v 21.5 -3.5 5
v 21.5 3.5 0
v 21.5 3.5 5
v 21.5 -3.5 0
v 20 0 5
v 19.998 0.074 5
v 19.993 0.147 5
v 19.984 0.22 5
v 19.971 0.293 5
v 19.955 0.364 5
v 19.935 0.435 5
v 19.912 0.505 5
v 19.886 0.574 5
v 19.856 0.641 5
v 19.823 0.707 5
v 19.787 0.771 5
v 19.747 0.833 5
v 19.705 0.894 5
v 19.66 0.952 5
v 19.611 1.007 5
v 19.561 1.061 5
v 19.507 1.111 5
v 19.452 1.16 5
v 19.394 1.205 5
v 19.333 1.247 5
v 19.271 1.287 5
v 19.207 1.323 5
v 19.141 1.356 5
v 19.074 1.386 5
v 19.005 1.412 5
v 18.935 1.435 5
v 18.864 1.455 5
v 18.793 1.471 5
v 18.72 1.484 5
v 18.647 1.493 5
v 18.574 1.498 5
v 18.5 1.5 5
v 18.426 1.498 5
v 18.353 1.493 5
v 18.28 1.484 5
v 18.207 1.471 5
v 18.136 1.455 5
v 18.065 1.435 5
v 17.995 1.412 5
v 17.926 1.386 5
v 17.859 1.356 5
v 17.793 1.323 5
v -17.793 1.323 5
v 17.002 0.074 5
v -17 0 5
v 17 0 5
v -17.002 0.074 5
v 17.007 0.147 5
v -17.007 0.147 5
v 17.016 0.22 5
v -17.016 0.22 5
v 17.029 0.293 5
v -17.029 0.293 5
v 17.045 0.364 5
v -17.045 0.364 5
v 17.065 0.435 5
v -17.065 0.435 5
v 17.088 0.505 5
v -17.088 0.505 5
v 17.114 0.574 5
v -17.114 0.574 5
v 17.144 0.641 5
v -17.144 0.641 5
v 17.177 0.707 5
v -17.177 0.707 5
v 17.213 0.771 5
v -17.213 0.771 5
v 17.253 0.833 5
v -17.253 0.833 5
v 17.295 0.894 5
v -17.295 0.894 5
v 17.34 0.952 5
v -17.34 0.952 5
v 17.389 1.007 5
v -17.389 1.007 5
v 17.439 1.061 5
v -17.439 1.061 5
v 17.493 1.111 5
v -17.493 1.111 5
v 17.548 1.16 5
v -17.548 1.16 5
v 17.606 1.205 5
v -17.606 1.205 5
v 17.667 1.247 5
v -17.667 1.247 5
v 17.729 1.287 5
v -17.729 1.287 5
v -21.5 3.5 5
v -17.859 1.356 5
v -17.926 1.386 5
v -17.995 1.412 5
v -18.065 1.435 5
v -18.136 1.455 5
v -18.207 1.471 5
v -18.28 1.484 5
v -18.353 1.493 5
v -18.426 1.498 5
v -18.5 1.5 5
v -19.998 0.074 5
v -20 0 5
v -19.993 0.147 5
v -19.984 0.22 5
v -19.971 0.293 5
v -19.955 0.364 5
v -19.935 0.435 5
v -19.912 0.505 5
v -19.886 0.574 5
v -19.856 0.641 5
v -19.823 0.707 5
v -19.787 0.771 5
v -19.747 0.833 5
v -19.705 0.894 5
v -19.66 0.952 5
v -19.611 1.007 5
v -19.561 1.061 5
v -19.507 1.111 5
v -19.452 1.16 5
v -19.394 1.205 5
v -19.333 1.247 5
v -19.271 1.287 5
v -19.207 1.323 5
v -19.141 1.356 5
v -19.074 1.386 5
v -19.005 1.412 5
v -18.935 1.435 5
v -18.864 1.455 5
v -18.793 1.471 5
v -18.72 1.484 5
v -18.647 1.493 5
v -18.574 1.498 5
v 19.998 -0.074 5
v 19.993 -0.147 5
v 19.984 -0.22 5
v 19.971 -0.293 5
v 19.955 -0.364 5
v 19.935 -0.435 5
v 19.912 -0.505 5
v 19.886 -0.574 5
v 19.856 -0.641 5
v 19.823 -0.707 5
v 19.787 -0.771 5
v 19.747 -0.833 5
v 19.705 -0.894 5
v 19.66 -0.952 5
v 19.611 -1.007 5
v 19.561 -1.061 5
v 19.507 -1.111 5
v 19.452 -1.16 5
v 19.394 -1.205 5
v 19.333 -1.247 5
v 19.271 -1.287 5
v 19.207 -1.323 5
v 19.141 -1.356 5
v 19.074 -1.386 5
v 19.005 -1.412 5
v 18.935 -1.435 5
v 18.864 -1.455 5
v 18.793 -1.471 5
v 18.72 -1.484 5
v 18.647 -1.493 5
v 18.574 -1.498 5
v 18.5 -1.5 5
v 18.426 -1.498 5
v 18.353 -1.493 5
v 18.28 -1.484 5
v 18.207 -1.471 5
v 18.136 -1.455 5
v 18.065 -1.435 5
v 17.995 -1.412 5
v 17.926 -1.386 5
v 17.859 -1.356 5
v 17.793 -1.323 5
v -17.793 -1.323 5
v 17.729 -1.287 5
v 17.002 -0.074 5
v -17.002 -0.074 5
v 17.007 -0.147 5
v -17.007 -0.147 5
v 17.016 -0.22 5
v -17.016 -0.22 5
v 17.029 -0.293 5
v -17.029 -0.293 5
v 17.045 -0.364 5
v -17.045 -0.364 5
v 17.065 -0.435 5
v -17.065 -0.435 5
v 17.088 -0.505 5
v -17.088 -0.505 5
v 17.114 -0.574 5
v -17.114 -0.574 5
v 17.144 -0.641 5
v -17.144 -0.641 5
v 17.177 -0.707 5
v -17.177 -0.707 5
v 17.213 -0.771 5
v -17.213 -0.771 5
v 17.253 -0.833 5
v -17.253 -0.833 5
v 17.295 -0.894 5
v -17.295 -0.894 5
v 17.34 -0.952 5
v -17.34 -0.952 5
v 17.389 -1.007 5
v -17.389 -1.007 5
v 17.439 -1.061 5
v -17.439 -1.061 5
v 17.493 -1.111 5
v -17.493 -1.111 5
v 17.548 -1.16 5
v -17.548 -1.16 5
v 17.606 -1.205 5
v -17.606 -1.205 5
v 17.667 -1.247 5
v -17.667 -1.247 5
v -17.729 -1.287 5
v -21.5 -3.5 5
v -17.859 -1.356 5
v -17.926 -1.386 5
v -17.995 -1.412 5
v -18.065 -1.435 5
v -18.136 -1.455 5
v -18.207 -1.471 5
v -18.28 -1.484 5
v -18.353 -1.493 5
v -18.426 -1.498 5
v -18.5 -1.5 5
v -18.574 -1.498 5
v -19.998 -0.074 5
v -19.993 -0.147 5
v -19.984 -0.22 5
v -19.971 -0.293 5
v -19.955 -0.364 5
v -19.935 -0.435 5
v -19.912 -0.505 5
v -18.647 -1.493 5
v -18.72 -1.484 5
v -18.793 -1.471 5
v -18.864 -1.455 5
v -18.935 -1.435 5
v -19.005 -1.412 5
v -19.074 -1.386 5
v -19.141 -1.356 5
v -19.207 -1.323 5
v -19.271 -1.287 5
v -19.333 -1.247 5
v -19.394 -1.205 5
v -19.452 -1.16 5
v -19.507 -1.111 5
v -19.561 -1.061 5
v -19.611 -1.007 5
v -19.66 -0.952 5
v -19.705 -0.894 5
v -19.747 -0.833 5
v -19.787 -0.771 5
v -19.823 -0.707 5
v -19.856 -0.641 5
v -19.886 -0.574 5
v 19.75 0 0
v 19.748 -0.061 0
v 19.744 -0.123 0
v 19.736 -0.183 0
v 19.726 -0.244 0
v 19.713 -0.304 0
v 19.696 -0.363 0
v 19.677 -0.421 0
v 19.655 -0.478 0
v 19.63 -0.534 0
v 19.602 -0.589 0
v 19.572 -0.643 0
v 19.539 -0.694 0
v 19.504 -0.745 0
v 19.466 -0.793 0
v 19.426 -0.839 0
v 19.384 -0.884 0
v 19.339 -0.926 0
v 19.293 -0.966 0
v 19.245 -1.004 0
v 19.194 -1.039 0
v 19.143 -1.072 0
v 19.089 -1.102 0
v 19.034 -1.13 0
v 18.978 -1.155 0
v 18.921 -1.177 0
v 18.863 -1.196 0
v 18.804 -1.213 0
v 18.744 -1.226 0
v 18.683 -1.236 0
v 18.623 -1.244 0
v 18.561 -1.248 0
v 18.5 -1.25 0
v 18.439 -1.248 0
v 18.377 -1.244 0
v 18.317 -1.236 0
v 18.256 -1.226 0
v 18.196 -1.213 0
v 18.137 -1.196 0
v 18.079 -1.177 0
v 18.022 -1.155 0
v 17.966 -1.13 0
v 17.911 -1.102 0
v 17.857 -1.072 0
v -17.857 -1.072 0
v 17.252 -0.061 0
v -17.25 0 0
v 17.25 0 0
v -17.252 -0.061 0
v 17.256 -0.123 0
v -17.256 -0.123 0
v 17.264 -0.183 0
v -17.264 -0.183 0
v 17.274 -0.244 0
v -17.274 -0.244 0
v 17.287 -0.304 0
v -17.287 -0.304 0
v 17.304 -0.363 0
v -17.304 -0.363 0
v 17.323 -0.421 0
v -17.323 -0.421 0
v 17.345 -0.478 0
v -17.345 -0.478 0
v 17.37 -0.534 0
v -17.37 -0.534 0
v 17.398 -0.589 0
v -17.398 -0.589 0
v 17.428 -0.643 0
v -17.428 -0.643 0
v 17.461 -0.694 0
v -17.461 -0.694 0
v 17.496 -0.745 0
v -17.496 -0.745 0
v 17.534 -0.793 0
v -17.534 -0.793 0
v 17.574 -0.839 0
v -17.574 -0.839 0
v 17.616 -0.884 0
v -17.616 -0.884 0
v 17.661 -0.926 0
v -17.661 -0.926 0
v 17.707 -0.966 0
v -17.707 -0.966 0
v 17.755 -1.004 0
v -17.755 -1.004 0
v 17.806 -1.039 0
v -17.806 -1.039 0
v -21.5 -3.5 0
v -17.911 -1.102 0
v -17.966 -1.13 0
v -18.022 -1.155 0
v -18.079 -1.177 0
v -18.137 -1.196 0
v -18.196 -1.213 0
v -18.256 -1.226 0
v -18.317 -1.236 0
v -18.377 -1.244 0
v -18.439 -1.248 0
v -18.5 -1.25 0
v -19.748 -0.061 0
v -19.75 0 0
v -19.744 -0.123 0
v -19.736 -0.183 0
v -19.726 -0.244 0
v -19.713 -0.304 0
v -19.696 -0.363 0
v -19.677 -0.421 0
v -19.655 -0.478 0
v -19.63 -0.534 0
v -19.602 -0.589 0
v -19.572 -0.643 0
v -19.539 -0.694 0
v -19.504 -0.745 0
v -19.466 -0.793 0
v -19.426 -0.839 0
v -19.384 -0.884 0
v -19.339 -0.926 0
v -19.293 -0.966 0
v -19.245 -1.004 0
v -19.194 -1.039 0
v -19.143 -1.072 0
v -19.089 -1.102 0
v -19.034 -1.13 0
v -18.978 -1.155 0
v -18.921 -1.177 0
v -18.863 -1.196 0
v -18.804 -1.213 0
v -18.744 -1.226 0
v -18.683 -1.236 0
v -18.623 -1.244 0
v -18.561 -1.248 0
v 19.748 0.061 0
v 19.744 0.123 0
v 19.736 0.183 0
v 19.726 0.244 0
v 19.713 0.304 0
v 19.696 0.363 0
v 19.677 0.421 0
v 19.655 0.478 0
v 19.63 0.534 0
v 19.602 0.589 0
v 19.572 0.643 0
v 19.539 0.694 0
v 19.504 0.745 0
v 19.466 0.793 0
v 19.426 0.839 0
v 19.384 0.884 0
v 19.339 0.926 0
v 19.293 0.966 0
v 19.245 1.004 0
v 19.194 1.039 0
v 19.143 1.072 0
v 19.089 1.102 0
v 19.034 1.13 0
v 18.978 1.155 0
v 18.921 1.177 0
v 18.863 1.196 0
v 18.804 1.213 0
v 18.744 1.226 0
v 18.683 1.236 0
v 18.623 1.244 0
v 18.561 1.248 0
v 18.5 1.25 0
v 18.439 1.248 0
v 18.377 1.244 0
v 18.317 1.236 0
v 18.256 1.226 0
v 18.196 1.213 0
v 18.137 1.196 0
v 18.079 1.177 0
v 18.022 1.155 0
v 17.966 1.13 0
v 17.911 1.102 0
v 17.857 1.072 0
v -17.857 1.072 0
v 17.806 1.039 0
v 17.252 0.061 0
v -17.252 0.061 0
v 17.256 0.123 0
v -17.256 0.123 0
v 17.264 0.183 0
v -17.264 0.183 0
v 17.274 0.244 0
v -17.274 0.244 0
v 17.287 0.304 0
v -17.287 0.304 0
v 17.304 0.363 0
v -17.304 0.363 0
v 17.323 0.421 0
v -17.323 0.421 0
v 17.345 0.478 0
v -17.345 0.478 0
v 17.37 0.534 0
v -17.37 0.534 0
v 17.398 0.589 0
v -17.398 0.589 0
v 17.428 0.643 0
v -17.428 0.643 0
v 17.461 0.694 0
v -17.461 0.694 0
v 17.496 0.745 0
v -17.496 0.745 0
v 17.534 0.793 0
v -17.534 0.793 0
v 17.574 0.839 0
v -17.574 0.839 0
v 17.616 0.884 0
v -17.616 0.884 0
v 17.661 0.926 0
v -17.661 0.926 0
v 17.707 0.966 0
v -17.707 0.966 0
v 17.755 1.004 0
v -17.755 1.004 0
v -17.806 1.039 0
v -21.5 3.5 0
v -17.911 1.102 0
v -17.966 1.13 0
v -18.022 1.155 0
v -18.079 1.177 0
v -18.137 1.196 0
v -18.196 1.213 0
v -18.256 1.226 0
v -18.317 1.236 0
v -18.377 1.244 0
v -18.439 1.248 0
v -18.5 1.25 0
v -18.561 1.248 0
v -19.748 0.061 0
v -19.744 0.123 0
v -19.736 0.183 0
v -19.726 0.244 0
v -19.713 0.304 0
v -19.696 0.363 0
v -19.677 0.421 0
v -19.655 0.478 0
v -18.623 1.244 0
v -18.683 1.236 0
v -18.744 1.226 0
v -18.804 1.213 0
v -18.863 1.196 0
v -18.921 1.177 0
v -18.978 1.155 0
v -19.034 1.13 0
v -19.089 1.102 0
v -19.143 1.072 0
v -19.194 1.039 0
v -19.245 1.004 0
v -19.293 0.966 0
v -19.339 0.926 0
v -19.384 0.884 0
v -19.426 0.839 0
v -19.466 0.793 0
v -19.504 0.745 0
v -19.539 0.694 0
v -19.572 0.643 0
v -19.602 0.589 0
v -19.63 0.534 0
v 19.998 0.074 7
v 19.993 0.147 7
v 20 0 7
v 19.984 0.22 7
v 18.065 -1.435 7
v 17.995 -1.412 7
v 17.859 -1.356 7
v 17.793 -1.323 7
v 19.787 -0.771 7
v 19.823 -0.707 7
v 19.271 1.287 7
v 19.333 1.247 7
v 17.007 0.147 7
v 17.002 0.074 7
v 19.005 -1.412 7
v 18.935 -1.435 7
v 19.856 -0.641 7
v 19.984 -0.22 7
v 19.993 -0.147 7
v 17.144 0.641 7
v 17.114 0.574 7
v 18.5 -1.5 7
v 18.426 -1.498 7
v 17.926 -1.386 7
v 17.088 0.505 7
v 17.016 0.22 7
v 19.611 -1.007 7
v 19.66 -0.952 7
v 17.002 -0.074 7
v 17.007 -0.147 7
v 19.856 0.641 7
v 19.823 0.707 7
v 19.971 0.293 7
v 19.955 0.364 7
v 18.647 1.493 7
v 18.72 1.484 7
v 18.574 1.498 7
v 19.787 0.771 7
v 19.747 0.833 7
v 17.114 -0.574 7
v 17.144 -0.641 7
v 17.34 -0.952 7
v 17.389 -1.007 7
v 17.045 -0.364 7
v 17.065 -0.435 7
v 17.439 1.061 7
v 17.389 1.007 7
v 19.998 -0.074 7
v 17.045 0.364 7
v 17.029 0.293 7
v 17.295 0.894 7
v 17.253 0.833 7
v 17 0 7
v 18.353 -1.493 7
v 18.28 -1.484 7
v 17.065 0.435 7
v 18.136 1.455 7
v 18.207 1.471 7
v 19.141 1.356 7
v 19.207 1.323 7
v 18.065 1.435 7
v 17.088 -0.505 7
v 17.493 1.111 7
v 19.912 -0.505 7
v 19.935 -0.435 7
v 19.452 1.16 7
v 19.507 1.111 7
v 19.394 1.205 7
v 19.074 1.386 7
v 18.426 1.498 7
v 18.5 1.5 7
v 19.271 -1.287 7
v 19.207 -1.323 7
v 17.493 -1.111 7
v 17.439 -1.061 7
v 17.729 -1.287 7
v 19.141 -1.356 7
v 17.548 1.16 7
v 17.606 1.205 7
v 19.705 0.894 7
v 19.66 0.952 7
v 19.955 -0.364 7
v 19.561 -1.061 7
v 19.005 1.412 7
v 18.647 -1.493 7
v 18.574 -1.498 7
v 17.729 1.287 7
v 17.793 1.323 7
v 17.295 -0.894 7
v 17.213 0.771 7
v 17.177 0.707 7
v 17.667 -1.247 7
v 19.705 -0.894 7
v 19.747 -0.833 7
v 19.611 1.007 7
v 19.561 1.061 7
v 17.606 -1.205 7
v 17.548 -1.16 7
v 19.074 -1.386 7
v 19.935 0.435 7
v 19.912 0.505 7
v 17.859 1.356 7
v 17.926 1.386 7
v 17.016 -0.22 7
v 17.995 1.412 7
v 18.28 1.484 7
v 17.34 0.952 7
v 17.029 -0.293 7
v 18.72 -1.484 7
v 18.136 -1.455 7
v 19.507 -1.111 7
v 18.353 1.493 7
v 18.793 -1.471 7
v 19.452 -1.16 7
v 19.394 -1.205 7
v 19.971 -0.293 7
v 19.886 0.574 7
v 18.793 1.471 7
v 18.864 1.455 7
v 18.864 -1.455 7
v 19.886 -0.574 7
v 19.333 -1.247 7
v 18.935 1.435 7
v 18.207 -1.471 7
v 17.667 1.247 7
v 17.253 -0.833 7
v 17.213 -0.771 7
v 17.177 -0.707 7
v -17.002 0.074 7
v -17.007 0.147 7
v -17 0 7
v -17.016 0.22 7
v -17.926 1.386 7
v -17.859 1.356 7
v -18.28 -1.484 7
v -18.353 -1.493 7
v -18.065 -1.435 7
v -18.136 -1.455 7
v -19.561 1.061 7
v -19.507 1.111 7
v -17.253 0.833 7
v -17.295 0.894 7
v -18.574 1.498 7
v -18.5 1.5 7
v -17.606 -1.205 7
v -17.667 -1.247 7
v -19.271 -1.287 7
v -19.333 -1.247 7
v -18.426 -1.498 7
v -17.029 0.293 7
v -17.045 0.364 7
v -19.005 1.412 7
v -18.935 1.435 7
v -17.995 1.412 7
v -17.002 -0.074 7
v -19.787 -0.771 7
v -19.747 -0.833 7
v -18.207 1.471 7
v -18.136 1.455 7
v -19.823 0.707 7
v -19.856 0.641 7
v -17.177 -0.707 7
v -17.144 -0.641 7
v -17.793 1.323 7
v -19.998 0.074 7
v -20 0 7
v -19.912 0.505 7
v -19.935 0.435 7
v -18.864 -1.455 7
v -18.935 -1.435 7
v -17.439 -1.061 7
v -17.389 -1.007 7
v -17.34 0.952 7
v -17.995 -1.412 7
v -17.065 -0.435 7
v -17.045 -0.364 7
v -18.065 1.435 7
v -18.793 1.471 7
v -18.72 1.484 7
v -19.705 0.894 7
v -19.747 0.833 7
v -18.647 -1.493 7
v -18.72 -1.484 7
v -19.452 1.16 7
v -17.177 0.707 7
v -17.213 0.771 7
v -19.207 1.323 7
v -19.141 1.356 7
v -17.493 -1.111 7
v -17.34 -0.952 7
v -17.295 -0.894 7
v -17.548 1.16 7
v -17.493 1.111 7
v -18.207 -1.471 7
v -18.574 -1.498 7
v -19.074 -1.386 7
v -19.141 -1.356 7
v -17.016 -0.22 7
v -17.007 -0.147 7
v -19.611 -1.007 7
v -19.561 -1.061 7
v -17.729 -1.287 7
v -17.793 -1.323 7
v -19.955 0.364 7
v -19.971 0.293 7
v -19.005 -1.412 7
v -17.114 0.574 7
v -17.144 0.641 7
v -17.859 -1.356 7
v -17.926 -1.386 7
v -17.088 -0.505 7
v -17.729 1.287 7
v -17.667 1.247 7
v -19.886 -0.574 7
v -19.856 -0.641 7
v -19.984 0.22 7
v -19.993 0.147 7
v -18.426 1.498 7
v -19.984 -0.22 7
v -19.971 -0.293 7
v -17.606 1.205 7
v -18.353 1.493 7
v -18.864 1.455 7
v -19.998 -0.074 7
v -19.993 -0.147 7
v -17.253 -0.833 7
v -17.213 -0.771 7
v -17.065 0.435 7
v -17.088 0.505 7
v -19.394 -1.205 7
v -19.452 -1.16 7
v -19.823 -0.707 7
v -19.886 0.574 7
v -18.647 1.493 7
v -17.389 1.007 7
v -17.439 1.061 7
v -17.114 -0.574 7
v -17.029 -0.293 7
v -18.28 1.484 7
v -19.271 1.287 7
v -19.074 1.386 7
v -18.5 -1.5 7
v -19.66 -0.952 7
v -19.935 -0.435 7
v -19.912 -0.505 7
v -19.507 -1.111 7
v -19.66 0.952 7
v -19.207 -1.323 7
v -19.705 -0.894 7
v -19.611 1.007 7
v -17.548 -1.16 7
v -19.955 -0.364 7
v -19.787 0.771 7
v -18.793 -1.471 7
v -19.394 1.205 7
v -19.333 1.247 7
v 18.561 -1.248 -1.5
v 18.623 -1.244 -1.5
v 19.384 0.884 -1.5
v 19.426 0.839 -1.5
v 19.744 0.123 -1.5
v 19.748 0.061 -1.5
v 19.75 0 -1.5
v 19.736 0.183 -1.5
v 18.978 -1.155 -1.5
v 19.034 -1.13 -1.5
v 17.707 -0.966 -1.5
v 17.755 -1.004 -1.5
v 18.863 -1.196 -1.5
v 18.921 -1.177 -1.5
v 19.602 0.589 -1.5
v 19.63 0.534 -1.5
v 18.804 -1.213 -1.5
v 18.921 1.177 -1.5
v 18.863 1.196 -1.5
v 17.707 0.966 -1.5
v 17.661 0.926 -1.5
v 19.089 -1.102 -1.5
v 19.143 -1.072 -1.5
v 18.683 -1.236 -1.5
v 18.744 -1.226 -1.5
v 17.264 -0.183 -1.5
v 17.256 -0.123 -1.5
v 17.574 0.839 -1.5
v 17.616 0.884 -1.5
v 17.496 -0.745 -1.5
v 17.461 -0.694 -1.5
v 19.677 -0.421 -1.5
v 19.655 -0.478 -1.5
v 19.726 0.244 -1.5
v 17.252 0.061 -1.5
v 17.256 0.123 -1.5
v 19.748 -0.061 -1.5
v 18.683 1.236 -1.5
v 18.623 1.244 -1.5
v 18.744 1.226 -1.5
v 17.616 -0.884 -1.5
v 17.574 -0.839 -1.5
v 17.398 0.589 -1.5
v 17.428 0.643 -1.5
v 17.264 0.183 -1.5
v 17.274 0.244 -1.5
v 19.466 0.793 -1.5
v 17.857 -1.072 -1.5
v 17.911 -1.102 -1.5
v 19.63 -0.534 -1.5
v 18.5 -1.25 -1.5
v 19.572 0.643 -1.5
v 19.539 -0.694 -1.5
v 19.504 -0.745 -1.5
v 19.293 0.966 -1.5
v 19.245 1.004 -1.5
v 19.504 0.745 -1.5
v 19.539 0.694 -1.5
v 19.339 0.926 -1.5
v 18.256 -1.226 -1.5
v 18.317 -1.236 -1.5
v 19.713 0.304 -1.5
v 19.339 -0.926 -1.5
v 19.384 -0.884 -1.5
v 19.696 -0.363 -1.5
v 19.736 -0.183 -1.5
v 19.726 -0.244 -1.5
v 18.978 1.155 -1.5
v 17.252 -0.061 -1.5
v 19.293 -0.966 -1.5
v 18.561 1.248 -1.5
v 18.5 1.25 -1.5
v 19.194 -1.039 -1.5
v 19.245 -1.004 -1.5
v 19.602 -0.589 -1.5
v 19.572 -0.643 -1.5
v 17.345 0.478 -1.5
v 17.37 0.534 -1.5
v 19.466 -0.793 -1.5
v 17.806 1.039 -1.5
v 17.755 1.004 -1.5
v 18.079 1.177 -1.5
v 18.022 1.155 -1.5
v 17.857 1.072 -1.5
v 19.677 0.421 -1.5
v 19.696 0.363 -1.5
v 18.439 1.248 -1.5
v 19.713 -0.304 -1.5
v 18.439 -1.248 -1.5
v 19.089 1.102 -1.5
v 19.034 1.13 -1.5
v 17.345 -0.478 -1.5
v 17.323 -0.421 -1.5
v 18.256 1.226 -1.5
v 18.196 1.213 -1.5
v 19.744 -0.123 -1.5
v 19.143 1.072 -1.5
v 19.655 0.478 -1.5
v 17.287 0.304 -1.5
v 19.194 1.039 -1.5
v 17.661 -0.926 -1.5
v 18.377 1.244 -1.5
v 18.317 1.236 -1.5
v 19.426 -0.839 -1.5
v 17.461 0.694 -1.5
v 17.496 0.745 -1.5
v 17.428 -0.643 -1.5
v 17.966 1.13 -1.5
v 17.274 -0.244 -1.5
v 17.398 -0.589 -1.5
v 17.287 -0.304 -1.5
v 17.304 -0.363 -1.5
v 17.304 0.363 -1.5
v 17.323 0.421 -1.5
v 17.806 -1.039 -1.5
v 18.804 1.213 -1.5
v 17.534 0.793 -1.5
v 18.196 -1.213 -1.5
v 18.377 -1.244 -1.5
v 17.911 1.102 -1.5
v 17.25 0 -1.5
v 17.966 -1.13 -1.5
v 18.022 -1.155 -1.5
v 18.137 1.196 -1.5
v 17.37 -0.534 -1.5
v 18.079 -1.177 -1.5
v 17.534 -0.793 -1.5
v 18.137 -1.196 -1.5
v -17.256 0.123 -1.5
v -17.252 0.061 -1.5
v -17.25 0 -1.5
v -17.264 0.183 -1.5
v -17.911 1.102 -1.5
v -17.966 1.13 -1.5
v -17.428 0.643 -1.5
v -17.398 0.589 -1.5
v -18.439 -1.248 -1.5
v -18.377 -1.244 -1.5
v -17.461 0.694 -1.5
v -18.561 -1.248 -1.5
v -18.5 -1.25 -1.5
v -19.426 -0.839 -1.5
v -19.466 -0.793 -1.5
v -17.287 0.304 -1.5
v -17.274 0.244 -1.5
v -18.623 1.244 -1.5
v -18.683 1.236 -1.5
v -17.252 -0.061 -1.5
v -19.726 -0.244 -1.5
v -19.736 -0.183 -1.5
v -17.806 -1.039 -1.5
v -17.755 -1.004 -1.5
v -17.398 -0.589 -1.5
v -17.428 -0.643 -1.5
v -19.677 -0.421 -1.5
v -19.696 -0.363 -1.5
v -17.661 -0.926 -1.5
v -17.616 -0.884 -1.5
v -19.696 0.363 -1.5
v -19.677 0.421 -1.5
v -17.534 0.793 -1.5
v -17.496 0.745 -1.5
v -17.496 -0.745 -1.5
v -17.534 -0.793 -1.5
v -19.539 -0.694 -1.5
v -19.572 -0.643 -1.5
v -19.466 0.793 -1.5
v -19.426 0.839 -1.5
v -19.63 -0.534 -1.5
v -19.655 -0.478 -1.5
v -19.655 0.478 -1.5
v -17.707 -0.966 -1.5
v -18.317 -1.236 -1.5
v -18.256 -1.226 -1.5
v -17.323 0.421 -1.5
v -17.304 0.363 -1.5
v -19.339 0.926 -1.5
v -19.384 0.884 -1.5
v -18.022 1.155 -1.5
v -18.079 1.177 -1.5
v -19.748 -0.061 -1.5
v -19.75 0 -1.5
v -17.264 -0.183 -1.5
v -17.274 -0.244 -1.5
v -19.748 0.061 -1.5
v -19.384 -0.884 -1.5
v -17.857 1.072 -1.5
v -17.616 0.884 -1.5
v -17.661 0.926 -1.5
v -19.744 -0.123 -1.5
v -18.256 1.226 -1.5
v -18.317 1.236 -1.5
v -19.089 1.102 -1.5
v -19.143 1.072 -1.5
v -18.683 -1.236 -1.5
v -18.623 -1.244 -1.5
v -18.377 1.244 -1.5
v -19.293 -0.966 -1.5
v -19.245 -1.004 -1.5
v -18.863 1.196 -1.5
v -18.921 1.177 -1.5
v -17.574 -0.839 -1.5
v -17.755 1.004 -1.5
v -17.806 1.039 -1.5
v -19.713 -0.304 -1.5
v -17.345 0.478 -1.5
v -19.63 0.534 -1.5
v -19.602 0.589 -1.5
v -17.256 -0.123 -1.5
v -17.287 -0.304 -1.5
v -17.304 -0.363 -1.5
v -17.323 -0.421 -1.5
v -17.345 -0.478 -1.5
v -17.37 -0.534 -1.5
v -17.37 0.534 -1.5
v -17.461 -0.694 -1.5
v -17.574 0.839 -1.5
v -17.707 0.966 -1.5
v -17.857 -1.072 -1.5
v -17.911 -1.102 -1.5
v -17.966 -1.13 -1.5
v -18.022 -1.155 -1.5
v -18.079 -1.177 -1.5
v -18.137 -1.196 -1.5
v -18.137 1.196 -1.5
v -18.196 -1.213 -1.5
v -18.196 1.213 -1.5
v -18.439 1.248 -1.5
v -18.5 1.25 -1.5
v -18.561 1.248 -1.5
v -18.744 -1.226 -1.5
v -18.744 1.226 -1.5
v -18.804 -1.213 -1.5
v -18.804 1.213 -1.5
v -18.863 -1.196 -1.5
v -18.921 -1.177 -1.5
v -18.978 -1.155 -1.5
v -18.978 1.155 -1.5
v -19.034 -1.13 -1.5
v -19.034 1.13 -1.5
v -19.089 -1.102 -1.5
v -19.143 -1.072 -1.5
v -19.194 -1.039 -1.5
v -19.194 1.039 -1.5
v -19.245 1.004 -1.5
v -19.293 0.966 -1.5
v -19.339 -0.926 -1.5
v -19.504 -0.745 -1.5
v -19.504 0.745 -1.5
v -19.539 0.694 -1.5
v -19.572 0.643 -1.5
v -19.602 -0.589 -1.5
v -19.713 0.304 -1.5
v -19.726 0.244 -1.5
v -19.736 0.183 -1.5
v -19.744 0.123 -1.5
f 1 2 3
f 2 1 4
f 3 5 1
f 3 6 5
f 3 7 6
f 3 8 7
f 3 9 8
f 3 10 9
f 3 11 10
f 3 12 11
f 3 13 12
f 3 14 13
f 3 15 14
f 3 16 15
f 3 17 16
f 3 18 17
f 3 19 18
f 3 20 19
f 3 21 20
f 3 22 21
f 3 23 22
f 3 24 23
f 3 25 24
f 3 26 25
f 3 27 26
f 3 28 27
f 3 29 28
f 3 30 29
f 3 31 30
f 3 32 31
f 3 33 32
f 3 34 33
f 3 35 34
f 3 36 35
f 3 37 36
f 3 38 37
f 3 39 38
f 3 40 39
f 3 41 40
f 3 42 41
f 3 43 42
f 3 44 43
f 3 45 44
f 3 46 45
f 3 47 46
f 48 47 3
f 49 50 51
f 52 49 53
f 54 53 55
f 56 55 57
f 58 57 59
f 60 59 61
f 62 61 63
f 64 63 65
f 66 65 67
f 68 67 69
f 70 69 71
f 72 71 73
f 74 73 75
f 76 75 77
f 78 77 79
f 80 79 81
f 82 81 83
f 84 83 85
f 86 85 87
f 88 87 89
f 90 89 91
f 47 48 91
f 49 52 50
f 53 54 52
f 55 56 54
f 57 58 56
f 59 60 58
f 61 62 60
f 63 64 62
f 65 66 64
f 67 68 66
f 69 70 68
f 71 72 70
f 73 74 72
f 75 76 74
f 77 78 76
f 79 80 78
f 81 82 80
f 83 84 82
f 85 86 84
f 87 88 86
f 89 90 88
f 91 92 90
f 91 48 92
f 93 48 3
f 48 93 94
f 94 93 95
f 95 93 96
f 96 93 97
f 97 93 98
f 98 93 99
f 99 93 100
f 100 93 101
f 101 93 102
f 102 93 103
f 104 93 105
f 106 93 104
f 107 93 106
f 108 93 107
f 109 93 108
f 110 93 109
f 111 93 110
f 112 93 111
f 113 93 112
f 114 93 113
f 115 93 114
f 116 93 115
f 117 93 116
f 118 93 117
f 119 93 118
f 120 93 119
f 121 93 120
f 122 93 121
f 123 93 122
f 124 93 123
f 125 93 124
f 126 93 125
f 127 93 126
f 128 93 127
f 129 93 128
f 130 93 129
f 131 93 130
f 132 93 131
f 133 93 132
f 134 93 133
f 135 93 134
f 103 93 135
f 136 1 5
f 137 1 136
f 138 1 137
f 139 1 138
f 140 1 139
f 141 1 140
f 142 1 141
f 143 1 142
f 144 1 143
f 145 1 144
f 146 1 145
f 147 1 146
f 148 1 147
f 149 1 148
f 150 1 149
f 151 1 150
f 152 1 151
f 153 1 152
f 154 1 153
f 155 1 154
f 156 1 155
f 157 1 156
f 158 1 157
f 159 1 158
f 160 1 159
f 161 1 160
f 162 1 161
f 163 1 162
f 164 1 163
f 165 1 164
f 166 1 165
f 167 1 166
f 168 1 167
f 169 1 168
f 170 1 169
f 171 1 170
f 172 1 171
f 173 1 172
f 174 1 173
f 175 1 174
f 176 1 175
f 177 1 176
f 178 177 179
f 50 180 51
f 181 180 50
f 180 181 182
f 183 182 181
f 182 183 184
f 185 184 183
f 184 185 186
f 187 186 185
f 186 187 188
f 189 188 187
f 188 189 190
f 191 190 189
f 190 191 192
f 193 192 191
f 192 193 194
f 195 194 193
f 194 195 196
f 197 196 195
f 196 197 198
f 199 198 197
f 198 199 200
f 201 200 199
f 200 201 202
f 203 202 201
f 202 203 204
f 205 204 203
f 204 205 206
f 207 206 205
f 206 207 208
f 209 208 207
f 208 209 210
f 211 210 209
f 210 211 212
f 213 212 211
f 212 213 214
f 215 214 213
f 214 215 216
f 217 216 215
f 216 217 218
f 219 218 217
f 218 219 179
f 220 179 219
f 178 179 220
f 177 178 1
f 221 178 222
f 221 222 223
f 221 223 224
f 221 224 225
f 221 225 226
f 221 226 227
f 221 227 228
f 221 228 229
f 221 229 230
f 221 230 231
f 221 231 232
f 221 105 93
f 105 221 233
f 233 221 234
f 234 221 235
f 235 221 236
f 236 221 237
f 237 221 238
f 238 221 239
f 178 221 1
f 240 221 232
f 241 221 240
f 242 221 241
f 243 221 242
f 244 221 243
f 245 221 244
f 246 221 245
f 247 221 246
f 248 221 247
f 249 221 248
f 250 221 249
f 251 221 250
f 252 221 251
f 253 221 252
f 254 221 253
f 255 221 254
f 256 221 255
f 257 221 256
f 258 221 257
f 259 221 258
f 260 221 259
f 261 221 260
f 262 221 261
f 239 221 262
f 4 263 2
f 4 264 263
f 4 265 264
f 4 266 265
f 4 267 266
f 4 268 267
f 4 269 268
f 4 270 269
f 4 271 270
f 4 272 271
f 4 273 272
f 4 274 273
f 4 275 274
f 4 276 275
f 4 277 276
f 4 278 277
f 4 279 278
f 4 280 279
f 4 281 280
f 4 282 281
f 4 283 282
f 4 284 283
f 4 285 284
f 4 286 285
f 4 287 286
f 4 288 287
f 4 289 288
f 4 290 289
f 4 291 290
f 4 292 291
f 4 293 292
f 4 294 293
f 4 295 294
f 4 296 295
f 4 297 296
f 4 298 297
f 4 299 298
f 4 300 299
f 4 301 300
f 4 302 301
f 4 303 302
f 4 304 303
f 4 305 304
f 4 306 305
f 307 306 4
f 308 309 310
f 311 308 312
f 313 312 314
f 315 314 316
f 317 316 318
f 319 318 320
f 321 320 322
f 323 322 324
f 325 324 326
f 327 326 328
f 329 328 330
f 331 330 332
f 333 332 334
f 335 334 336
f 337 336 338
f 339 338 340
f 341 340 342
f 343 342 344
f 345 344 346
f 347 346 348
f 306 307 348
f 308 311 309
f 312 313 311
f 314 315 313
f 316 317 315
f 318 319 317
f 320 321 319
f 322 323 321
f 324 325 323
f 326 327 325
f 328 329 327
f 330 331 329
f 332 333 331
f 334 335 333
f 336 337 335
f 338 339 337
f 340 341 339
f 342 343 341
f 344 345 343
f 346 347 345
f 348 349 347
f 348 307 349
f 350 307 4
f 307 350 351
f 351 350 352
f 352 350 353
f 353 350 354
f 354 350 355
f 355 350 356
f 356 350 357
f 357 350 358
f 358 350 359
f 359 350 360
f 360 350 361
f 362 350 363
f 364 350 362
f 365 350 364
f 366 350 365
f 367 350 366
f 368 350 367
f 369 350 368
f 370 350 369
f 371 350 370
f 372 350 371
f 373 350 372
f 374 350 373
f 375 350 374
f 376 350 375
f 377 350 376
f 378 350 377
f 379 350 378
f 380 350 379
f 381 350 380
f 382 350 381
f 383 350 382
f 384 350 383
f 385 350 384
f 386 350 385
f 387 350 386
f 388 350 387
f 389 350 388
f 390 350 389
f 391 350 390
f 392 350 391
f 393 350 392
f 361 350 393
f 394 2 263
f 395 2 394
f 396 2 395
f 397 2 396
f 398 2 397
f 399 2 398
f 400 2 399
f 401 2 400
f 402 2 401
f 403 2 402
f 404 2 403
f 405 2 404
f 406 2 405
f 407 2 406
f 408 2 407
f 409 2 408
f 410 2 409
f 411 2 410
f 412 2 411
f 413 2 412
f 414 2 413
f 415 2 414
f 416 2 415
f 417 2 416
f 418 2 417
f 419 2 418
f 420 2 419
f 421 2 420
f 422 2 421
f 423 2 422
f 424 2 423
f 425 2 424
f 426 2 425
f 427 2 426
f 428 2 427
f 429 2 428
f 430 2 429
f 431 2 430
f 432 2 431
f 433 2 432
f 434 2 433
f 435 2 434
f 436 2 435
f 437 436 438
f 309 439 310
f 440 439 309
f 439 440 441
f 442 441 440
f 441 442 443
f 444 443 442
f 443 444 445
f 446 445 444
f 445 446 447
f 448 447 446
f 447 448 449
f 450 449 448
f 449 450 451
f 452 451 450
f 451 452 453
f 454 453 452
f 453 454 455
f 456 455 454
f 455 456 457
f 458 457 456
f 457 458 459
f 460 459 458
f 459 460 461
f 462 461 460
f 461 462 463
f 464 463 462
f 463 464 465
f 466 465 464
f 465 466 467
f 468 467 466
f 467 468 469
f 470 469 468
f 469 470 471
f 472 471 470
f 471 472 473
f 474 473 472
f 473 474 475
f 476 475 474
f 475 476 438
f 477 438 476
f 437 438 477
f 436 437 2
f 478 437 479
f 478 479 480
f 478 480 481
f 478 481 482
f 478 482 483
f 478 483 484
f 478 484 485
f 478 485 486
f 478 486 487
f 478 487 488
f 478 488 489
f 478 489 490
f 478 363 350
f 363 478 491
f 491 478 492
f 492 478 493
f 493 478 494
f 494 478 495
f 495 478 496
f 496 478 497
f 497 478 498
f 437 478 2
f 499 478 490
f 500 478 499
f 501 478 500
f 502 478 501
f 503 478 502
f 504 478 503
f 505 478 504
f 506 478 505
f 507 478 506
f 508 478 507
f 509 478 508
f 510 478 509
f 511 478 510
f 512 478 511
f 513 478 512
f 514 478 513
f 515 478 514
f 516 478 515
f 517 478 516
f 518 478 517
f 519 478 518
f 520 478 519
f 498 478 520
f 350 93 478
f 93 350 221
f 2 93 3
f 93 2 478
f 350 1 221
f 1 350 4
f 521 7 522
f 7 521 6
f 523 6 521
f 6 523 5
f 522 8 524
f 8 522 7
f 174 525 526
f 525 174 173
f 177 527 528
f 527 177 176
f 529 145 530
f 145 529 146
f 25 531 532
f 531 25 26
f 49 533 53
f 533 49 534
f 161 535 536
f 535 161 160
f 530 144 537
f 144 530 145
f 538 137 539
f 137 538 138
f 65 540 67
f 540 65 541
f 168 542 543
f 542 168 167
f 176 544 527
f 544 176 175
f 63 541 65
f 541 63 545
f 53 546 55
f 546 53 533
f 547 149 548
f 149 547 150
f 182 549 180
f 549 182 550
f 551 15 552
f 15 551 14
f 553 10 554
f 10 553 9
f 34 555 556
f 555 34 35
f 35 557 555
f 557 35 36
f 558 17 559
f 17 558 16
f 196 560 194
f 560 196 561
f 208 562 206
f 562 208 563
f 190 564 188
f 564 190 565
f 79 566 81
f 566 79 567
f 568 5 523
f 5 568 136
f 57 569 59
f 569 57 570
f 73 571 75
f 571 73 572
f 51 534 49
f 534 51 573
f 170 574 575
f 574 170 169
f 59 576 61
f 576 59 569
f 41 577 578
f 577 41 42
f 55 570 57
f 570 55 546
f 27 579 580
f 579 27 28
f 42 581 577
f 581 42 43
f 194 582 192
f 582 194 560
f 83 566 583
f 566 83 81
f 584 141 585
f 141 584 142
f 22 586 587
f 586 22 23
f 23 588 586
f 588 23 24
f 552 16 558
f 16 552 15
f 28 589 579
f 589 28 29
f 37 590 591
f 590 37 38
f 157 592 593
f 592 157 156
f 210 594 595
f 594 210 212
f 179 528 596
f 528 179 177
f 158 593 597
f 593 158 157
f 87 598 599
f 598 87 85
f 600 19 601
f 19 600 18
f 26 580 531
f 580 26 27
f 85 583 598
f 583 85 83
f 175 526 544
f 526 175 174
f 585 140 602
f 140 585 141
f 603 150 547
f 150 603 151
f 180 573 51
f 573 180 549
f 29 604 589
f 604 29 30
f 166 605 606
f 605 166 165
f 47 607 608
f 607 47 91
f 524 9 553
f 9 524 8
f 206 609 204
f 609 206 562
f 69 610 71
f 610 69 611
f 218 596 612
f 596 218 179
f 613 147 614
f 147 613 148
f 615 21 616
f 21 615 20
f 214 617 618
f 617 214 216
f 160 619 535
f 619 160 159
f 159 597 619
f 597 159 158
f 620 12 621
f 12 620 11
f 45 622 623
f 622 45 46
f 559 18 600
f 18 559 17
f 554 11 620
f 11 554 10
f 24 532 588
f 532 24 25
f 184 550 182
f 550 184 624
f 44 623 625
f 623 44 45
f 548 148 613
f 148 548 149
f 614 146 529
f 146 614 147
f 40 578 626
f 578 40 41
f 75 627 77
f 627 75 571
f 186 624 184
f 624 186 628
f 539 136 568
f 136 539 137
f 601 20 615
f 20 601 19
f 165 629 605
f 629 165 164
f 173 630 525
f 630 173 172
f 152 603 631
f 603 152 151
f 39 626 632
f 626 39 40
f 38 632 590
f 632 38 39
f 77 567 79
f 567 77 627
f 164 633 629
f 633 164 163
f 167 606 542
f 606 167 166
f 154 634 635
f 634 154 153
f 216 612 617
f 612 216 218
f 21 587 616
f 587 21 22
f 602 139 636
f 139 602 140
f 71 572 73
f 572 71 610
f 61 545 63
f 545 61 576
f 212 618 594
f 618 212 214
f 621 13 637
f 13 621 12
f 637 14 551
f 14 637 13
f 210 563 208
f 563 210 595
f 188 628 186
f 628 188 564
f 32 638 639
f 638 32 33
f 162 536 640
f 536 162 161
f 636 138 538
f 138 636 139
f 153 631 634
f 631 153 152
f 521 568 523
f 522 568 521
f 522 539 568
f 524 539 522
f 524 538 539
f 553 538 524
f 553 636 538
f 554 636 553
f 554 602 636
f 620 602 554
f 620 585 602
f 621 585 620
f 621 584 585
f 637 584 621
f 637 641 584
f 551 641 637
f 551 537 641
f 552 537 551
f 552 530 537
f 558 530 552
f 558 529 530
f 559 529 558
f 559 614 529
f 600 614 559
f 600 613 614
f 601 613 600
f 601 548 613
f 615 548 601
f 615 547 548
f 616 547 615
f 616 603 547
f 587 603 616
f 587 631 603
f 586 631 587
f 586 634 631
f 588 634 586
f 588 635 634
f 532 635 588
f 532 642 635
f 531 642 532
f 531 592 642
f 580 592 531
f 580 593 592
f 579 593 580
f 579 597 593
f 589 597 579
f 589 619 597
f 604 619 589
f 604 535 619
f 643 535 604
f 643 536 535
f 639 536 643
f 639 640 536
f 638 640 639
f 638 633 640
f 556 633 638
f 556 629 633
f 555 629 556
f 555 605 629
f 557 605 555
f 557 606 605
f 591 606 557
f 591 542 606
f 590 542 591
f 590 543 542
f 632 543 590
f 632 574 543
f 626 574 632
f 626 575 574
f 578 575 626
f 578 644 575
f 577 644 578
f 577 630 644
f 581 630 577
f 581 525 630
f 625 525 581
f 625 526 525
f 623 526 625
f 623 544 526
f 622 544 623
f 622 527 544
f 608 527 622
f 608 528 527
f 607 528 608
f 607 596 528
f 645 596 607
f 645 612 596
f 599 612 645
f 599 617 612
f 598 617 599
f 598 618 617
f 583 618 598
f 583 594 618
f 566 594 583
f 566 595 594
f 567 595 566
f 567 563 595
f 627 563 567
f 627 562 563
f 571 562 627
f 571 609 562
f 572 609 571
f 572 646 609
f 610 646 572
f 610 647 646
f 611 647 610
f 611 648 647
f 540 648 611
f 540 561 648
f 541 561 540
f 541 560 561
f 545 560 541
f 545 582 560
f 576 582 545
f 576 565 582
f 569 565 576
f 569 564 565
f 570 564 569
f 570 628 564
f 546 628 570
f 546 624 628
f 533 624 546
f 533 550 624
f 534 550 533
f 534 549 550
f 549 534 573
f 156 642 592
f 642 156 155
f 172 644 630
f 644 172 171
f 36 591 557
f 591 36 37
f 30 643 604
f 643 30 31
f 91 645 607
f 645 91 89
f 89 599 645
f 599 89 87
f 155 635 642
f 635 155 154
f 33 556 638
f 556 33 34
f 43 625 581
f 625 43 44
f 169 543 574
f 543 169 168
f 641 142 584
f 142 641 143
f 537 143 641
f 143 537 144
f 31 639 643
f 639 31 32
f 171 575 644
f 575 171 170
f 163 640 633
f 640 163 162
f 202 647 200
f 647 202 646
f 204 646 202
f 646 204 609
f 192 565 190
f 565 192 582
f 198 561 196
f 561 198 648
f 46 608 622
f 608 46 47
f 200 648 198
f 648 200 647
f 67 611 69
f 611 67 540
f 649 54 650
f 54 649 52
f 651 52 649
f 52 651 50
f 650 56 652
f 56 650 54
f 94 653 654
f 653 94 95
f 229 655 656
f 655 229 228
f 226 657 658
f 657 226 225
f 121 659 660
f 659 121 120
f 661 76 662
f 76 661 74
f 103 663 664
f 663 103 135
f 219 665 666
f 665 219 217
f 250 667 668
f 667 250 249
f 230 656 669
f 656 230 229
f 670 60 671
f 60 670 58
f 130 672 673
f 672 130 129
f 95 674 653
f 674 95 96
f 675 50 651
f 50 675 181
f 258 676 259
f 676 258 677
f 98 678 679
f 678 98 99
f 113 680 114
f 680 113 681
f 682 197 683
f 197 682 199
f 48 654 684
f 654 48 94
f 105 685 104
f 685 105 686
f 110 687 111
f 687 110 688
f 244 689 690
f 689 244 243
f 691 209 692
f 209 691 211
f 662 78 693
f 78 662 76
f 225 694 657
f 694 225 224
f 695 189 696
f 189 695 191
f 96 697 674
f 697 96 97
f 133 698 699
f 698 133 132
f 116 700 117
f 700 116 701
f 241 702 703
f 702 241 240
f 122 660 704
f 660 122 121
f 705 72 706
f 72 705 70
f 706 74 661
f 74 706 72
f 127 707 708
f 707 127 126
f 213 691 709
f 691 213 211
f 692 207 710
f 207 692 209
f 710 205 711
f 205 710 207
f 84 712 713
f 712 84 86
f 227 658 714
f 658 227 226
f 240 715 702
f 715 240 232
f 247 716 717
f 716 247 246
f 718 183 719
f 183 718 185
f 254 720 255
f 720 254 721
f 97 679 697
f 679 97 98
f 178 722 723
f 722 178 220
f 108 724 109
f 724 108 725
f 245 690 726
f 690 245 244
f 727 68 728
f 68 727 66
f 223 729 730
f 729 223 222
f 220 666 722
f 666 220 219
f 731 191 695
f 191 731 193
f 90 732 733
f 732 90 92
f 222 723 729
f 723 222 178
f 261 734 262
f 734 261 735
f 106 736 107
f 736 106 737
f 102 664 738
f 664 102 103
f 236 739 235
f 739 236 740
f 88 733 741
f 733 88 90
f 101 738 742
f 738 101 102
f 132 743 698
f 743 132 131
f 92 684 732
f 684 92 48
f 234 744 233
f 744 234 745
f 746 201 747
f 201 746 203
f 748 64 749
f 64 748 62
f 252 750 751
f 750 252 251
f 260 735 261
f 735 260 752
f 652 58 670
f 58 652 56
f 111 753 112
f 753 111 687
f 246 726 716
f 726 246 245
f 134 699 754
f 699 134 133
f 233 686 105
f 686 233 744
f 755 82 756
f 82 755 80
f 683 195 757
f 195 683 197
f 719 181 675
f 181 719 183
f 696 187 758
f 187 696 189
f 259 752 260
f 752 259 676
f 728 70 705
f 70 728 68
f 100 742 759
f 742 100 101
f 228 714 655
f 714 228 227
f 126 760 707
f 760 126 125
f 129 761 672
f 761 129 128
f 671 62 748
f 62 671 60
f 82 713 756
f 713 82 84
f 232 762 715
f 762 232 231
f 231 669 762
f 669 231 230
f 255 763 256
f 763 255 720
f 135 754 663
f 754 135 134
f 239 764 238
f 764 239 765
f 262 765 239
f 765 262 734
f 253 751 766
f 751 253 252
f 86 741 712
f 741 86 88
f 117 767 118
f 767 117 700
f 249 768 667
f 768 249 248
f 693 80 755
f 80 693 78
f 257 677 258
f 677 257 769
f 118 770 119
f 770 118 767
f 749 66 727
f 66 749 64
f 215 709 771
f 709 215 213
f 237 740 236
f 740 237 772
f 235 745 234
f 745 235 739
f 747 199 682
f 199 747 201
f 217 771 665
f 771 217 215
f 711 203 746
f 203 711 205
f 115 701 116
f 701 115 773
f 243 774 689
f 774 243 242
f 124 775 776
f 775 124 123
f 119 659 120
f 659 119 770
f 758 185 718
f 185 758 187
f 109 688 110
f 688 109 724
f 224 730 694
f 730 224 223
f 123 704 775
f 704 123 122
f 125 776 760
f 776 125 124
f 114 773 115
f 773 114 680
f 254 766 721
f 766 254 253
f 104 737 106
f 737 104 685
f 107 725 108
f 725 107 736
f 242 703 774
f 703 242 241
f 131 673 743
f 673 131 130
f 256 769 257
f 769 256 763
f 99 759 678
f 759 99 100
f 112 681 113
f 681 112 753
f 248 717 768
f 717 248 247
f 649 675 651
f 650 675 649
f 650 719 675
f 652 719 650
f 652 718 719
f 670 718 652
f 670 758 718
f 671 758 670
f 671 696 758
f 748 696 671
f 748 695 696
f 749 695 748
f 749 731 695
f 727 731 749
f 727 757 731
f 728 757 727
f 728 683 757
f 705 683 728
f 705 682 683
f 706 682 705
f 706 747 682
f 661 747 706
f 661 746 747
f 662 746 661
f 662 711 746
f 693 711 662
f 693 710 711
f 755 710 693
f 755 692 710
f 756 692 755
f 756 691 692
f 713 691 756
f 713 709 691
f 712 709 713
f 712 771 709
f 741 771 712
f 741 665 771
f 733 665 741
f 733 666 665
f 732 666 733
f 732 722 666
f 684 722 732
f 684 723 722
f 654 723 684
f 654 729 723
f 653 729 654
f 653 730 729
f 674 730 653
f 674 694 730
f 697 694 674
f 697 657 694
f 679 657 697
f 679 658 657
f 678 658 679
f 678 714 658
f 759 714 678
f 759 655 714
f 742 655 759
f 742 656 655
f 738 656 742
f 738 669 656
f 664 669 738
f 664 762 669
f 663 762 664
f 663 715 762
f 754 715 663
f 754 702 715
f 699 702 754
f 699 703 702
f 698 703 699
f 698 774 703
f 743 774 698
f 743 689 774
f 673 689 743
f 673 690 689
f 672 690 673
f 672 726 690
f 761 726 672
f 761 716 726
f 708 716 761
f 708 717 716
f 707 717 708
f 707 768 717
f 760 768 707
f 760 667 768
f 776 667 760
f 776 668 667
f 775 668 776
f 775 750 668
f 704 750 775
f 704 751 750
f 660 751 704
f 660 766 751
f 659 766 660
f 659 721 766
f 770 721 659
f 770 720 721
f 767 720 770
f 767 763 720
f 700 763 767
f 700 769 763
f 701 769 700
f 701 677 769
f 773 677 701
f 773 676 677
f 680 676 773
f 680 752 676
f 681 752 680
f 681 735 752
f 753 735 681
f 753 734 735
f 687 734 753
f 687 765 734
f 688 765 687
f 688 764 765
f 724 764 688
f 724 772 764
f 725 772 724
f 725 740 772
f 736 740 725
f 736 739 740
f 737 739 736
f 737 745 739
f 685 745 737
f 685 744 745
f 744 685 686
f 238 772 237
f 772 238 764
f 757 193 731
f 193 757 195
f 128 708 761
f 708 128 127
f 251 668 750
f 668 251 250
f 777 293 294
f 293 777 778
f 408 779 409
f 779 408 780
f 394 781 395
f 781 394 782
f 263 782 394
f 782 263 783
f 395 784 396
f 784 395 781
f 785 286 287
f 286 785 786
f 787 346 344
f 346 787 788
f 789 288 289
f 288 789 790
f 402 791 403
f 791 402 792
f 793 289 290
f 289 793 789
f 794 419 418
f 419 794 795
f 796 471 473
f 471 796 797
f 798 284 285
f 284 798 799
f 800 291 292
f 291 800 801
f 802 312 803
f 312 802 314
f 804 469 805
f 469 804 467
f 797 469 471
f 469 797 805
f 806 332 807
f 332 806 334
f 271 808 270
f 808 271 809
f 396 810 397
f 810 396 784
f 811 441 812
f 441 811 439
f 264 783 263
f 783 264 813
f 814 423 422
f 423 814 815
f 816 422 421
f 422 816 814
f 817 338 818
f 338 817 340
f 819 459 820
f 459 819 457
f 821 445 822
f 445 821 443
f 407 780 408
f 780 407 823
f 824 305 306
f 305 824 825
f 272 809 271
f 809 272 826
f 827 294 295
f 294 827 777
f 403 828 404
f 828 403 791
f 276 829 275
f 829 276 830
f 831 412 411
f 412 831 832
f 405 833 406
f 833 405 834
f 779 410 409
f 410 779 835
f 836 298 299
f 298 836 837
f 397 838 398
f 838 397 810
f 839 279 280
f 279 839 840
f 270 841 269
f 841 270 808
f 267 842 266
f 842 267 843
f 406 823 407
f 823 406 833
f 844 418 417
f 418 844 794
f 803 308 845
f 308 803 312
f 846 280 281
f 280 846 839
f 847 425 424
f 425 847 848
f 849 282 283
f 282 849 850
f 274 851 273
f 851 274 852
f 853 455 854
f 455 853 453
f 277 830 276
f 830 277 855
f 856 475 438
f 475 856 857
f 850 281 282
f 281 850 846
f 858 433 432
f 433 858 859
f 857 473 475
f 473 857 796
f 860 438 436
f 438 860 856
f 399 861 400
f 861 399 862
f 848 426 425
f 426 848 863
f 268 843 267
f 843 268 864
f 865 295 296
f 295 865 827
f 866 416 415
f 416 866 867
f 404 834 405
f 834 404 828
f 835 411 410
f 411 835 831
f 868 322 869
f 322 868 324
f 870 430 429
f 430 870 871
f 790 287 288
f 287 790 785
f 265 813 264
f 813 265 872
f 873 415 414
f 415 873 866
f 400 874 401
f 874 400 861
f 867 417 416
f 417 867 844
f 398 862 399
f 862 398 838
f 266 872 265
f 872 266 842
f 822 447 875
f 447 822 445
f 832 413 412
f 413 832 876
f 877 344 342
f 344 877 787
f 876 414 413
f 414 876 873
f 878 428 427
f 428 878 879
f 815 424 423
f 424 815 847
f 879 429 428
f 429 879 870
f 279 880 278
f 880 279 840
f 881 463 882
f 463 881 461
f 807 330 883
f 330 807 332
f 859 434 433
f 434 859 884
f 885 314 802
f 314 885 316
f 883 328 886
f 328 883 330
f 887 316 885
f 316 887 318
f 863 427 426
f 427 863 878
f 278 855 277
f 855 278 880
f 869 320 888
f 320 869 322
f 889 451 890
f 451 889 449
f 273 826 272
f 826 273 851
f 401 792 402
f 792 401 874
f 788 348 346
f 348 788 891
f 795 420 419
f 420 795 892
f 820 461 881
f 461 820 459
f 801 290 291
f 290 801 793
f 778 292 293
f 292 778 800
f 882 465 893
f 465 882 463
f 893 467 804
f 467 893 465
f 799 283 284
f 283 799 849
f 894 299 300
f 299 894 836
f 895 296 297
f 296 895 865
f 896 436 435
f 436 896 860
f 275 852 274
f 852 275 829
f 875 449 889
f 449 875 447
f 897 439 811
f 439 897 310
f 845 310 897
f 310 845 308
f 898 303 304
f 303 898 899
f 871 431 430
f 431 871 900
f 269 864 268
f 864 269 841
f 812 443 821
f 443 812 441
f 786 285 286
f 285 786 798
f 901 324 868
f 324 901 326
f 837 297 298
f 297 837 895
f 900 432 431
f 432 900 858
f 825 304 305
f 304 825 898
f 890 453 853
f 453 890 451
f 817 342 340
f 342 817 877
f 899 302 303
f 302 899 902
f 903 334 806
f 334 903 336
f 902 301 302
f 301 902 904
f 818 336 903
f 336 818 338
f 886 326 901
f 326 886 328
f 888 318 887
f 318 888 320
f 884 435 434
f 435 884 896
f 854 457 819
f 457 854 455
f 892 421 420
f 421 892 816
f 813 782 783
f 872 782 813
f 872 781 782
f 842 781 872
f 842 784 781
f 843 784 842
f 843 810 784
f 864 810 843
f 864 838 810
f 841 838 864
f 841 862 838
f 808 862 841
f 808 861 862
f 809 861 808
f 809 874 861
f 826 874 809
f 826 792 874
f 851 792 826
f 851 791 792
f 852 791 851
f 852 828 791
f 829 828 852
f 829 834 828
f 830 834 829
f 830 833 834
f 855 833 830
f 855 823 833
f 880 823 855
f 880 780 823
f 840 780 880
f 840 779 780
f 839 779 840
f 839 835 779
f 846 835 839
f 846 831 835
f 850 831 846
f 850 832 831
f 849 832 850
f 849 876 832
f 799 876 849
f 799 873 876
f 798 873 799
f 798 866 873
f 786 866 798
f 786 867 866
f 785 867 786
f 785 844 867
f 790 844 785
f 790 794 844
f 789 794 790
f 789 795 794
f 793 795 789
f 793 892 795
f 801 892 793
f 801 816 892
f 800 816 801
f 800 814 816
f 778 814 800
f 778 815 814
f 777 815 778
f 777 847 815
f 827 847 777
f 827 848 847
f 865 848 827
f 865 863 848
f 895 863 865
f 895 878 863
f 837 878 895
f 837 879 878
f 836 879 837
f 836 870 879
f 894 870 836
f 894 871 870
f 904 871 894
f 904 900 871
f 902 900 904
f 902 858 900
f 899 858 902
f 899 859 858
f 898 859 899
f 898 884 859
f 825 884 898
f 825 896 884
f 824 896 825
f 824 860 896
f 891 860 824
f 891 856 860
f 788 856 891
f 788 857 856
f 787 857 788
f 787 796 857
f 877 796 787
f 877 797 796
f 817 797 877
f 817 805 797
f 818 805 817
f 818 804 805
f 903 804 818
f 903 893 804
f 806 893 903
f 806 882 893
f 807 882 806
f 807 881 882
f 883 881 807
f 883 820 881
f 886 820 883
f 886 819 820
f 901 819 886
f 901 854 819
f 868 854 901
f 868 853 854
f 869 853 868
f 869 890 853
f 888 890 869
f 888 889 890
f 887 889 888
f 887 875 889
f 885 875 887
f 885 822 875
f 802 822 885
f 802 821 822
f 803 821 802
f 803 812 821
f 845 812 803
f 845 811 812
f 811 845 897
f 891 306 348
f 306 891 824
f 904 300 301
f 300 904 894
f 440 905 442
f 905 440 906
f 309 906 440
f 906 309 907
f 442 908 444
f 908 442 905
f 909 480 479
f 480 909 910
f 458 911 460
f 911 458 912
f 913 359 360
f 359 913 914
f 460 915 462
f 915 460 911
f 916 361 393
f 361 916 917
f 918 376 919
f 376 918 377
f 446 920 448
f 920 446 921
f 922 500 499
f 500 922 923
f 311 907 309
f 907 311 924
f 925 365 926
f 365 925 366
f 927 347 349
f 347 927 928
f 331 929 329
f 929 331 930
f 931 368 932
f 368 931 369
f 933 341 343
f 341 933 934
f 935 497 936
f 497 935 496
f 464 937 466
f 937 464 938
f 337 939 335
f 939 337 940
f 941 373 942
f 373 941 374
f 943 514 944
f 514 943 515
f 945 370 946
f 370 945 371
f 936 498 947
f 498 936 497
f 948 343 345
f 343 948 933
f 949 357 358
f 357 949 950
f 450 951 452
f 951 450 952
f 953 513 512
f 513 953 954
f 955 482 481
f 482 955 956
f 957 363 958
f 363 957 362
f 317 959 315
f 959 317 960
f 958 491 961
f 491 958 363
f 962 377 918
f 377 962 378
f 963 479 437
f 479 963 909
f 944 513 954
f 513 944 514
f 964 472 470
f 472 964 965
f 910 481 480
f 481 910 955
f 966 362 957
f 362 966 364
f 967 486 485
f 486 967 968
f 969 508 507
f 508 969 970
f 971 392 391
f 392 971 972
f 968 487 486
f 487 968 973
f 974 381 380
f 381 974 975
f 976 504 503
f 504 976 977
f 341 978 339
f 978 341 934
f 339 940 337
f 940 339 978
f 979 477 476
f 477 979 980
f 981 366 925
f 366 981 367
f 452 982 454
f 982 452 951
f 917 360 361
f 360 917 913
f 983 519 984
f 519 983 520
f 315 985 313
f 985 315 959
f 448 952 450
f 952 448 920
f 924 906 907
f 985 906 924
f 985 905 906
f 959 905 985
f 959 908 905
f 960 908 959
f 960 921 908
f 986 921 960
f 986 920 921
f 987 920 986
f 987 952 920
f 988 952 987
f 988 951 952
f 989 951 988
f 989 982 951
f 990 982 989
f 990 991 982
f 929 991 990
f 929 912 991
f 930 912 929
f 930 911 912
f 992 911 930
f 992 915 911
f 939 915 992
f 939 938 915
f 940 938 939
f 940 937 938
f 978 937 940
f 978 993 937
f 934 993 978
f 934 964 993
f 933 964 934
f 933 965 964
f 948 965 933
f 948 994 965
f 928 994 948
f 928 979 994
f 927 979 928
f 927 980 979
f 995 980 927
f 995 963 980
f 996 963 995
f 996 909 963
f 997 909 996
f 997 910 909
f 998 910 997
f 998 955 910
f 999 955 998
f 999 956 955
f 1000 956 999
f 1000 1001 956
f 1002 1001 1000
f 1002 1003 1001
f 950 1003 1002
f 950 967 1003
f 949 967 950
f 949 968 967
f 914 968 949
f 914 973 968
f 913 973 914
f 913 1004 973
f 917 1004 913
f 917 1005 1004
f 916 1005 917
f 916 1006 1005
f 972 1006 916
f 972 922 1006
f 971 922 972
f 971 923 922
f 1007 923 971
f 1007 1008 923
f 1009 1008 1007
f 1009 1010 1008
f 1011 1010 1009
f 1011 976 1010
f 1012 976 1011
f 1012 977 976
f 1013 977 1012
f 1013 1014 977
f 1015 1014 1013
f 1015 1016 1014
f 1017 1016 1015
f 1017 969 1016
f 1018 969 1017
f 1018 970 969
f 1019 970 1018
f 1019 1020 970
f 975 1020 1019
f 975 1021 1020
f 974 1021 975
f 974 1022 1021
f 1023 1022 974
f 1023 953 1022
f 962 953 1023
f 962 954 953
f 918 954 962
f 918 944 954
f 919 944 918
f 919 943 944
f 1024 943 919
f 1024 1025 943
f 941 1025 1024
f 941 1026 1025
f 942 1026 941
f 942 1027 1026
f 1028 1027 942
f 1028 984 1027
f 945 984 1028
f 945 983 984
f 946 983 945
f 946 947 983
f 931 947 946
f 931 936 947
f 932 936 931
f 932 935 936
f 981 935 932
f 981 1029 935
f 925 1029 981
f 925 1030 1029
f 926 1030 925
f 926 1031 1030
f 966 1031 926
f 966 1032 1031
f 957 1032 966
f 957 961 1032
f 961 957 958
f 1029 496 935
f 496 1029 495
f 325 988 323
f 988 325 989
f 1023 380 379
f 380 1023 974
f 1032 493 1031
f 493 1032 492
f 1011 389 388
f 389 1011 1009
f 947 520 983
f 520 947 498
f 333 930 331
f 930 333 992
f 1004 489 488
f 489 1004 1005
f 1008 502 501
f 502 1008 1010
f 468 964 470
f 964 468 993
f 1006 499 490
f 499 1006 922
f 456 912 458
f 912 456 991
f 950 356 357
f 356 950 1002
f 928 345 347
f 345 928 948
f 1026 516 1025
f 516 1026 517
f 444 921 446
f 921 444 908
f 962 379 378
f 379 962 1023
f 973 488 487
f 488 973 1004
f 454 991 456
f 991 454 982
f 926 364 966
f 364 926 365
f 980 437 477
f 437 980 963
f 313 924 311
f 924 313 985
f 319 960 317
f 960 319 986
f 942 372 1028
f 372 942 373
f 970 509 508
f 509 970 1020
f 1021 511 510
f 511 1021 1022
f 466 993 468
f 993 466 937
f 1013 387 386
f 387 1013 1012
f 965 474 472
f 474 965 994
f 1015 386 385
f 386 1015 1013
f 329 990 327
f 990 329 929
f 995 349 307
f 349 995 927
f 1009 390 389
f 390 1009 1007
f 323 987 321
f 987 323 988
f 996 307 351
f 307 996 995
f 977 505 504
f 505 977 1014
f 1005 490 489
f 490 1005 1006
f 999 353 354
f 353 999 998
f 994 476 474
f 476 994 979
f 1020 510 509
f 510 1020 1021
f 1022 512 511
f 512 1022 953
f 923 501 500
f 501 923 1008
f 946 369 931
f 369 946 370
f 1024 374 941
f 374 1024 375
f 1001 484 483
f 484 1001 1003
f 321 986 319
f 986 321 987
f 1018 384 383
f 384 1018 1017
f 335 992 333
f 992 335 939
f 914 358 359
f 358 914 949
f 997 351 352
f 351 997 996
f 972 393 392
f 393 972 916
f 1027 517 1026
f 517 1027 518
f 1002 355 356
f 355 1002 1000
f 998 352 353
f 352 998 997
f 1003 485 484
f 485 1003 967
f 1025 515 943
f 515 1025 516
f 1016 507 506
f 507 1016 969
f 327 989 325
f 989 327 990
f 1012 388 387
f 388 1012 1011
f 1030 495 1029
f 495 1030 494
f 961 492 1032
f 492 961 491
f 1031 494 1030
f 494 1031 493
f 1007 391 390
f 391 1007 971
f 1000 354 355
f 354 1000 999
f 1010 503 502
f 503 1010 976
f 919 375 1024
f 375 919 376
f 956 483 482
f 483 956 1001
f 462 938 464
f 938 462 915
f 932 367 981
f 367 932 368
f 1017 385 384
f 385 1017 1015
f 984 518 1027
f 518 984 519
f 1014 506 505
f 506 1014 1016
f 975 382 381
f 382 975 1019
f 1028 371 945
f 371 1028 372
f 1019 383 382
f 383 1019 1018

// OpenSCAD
// Definitions
// **************************


//Definition of circle angular resolution
$fn = 128;  

    translate([0,0,2.5]) cube([43,7,5], center=true);

    translate ([18.5,0,5]) cylinder (h=2,r=1.5);
    translate ([-18.5,0,5]) cylinder (h=2,r=1.5);

    translate ([18.5,0,-1.5]) cylinder (h=1.5,r=1.25);
    translate ([-18.5,0,-1.5]) cylinder (h=1.5,r=1.25);
     


 
